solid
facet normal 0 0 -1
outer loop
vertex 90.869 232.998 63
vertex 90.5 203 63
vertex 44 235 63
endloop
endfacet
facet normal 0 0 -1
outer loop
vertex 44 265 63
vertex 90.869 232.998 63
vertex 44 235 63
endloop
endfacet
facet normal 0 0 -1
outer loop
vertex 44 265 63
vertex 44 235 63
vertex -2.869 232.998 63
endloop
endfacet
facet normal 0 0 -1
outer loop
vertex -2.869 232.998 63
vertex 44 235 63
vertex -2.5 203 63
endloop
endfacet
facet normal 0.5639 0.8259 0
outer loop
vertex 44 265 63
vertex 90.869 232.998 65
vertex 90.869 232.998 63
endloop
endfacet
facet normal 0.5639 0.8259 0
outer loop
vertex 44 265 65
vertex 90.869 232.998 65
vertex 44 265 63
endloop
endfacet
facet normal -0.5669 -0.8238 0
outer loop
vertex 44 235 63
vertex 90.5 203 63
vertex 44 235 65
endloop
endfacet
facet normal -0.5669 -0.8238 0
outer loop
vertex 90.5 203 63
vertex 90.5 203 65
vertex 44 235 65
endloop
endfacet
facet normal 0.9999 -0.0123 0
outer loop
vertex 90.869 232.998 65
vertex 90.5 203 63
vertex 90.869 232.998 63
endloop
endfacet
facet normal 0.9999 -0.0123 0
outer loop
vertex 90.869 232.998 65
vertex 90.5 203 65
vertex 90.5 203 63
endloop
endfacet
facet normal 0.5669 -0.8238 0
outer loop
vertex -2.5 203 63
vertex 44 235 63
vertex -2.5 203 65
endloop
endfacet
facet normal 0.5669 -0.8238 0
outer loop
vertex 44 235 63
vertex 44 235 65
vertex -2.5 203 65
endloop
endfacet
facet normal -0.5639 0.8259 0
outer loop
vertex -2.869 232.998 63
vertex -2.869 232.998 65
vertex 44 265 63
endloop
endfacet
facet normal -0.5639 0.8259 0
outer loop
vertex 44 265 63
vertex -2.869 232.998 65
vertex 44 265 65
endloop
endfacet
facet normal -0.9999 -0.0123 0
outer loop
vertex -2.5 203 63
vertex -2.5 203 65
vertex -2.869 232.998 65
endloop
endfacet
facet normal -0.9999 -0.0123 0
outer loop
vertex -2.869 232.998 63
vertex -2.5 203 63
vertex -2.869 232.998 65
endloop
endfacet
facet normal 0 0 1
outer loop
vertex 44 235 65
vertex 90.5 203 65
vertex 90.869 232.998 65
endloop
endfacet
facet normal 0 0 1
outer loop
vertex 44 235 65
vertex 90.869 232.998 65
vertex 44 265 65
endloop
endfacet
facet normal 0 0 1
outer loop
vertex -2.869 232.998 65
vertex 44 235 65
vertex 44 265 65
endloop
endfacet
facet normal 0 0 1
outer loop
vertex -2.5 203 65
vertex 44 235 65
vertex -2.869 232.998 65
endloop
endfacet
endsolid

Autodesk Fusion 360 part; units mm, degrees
sketch "Esboço1" plane through (0, 0, 0) normal (0, 0, 1) x (1, 0, 0)
  line L0 (0, 0) -> (88, 0)
  line L1 (-2.5, 203) -> (0, 0)
  line L2 (90.5, 203) -> (88, 0)
  line L3 (44, 235) -> (90.5, 203)
  line L4 (44, 235) -> (-2.5, 203)
  line L5 (88.487, 201.9575) -> (86.0245, 2)
  line L6 (1.9755, 2) -> (86.0245, 2)
  line L7 (-0.487, 201.9575) -> (1.9755, 2)
  line L8 (44, 232.5722) -> (-0.487, 201.9575)
  line L9 (44, 232.5722) -> (88.487, 201.9575)
  dimension "d1" = 88
  dimension "d7" = -2
sketch "Esboço2" plane through (0, 0, 5) normal (0, 0, 1) x (-1, 0, 0)
  line L0 (-1.9755, -2) -> (0.487, -201.9575)
  line L1 (0.487, -201.9575) -> (-44, -232.5722)
  line L2 (-44, -232.5722) -> (-88.487, -201.9575)
  line L3 (-88.487, -201.9575) -> (-86.0245, -2)
  line L4 (-86.0245, -2) -> (-1.9755, -2)
  line L5 (-90.5, -203) -> (-44, -235)
  line L6 (-44, -235) -> (2.5, -203)
  line L7 (2.5, -203) -> (0, 0)
  line L8 (0, 0) -> (-88, 0)
  line L9 (-88, 0) -> (-90.5, -203)
  line L10 (-44, -228.9304) -> (-85.4675, -200.3937)
  line L11 (-85.4675, -200.3937) -> (-83.0612, -5)
  line L12 (-83.0612, -5) -> (-4.9388, -5)
  line L13 (-4.9388, -5) -> (-2.5325, -200.3937)
  line L14 (-2.5325, -200.3937) -> (-44, -228.9304)
  dimension "d10" = 3
sketch "Esboço3" plane through (0, 0, 5) normal (0, 0, 1) x (-1, 0, 0)
  line L0 (-4.9388, -5) -> (-2.5325, -200.3937)
  line L1 (-2.5325, -200.3937) -> (-44, -228.9304)
  line L2 (-44, -228.9304) -> (-85.4675, -200.3937)
  line L3 (-85.4675, -200.3937) -> (-83.0612, -5)
  line L4 (-83.0612, -5) -> (-4.9388, -5)
  line L5 (-4.0422, -199.6117) -> (-44, -227.1096)
  line L6 (-44, -227.1096) -> (-83.9578, -199.6117)
  line L7 (-83.9578, -199.6117) -> (-81.5796, -6.5)
  line L8 (-81.5796, -6.5) -> (-6.4204, -6.5)
  line L9 (-6.4204, -6.5) -> (-4.0422, -199.6117)
  line L10 (-86.0245, -2) -> (-88.487, -201.9575)
  line L11 (-88.487, -201.9575) -> (-44, -232.5722)
  line L12 (-44, -232.5722) -> (0.487, -201.9575)
  line L13 (0.487, -201.9575) -> (-1.9755, -2)
  line L14 (-1.9755, -2) -> (-86.0245, -2)
  dimension "d13" = 1.5
sketch "Esboço4" plane through (0, 0, 5) normal (0, 0, 1) x (-1, 0, 0)
  line L0 (-81.5796, -6.5) -> (-6.4204, -6.5)
  line L1 (-6.4204, -6.5) -> (-4.0422, -199.6117)
  line L2 (-4.0422, -199.6117) -> (-44, -227.1096)
  line L3 (-44, -227.1096) -> (-83.9578, -199.6117)
  line L4 (-83.9578, -199.6117) -> (-81.5796, -6.5)
  line L5 (-44, -233.1791) -> (0.9903, -202.2181)
  line L6 (0.9903, -202.2181) -> (-1.4816, -1.5)
  line L7 (-1.4816, -1.5) -> (-86.5184, -1.5)
  line L8 (-86.5184, -1.5) -> (-88.9903, -202.2181)
  line L9 (-88.9903, -202.2181) -> (-44, -233.1791)
  line L10 (-83.0612, -5) -> (-85.4675, -200.3937)
  line L11 (-85.4675, -200.3937) -> (-44, -228.9304)
  line L12 (-44, -228.9304) -> (-2.5325, -200.3937)
  line L13 (-2.5325, -200.3937) -> (-4.9388, -5)
  line L14 (-4.9388, -5) -> (-83.0612, -5)
sketch "Esboço5" plane through (86.4868, -1.0651, 0) normal (-0.9999, 0.0123, 0) x (-0.0123, -0.9999, 0)
  line L0 (-2.5653, 5) -> (-2.5653, 65)
  line L1 (-2.5653, 65) -> (-203.2986, 65)
  line L2 (-203.2986, 65) -> (-203.2986, 5)
  line L3 (-2.5653, 65) -> (-2.5653, 63)
  line L4 (-2.5653, 63) -> (-10.5653, 63)
  line L5 (-10.5653, 63) -> (-10.5653, 60)
  line L6 (-10.5653, 60) -> (-2.5653, 60)
  line L7 (-203.2986, 5) -> (-2.5653, 5)
  dimension "d19" = 2
  dimension "d20" = 8
  dimension "d21" = 3
sketch "Esboço6" plane through (0, 0, 63) normal (0, 0, 1) x (-1, 0, 0)
  line L0 (-86.6169, -9.4994) -> (-78.6175, -9.5979)
  line L1 (-78.6175, -9.5979) -> (-78.519, -1.5985)
  line L2 (-78.519, -1.5985) -> (-86.5184, -1.5)
  line L3 (-78.519, -1.5985) -> (-86.6169, -9.4994)
  line L4 (-86.5184, -1.5) -> (-86.6169, -9.4994)
sketch "Esboço7" plane through (0, 0, 63) normal (0, 0, 1) x (-1, 0, 0)
  line L0 (-86.6169, -9.4994) -> (-78.519, -1.5985)
  line L1 (-78.519, -1.5985) -> (-86.5184, -1.5)
  circle A0 centre (-84.5431, -3.5245) radius 1
  line L2 (-86.5184, -1.5) -> (-86.6169, -9.4994)
  dimension "d26" = 2
sketch "Esboço8" plane through (1.4999, 0.0185, 0) normal (0.9999, 0.0123, 0) x (-0.0123, 0.9999, 0)
  line L0 (202.215, 5) -> (202.215, 65)
  line L1 (202.215, 65) -> (1.4816, 65)
  line L2 (1.4816, 65) -> (1.4816, 5)
  line L3 (1.4816, 65) -> (1.4816, 63)
  line L4 (1.4816, 63) -> (9.4816, 63)
  line L5 (9.4816, 63) -> (9.4816, 60)
  line L6 (9.4816, 60) -> (1.4816, 60)
  line L7 (1.4816, 5) -> (202.215, 5)
  dimension "d29" = 2
  dimension "d30" = 8
sketch "Esboço9" plane through (0, 0, 63) normal (0, 0, 1) x (-1, 0, 0)
  line L0 (-1.4816, -1.5) -> (-9.481, -1.5985)
  line L1 (-9.481, -1.5985) -> (-9.3825, -9.5979)
  line L2 (-9.3825, -9.5979) -> (-1.3831, -9.4994)
  line L3 (-9.481, -1.5985) -> (-1.3831, -9.4994)
  line L4 (-1.3831, -9.4994) -> (-1.4816, -1.5)
sketch "Esboço10" plane through (0, 0, 63) normal (0, 0, 1) x (-1, 0, 0)
  line L0 (-9.481, -1.5985) -> (-1.3831, -9.4994)
  line L1 (-1.4816, -1.5) -> (-9.481, -1.5985)
  circle A0 centre (-3.4569, -3.5245) radius 1
  line L2 (-1.3831, -9.4994) -> (-1.4816, -1.5)
  dimension "d35" = 2
sketch "Esboço11" plane through (-94.7554, 137.6915, 0) normal (0.5669, -0.8238, 0) x (0.8238, 0.5669, 0)
  line L0 (168.4368, 5) -> (168.4368, 65)
  line L1 (168.4368, 65) -> (113.8226, 65)
  line L2 (113.8226, 65) -> (113.8226, 5)
  line L3 (113.8226, 5) -> (168.4368, 5)
sketch "Esboço12" plane through (0, 0, 0) normal (0, 0, 1) x (1, 0, 0)
ref_plane "Plano de trabalho2" through (0, 0, 60) normal (0, 0, 1) x (1, 0, 0)
sketch "Esboço13" plane through (0, 0, 60) normal (0, 0, 1) x (1, 0, 0)
  line L0 (44, 229.2) -> (38, 229.2)
  line L1 (44, 229.2) -> (49.6973, 229.2)
  line L2 (38, 229.2) -> (44, 233.5)
  line L3 (44, 233.5) -> (49.6973, 229.2)
sketch "Esboço14" plane through (0, 0, 63) normal (0, 0, 1) x (-1, 0, 0)
  line L0 (-38, -229.2) -> (-49.6973, -229.2)
  line L1 (-49.6973, -229.2) -> (-44, -233.5)
  circle A0 centre (-43.9788, -231.1896) radius 1
  line L2 (-44, -233.5) -> (-38, -229.2)
  dimension "d48" = 2
sketch "Esboço15" plane through (0, 0, 65) normal (0, 0, 1) x (-1, 0, 0)
  line L0 (-44, -233.1791) -> (-88.9903, -202.2181)
  line L1 (-88.9903, -202.2181) -> (-86.5184, -1.5)
  line L2 (-86.5184, -1.5) -> (-1.4816, -1.5)
  line L3 (-1.4816, -1.5) -> (0.9903, -202.2181)
  line L4 (0.9903, -202.2181) -> (-44, -233.1791)
  line L5 (-88, 0) -> (-90.5, -203)
  line L6 (-90.5, -203) -> (-44, -235)
  line L7 (-44, -235) -> (2.5, -203)
  line L8 (2.5, -203) -> (0, 0)
  line L9 (0, 0) -> (-88, 0)
  line L10 (-196.5184, -1.5) -> (-111.4816, -1.5)
  line L11 (-198.9903, -202.2181) -> (-196.5184, -1.5)
  line L12 (-111.4816, -1.5) -> (-109.0097, -202.2181)
  line L13 (168.4368, 65) -> (113.8226, 65)
  line L14 (168.4368, 65) -> (113.8226, 65)
  line L15 (168.4368, 65) -> (113.8226, 65)
  line L16 (-154, -233.1791) -> (-198.9903, -202.2181)
  line L17 (-109.0097, -202.2181) -> (-154, -233.1791)
sketch "Esboço16" plane through (0, 0, 63) normal (0, 0, 1) x (-1, 0, 0)
  line L0 (-38, -229.2) -> (-49.6973, -229.2)
  line L1 (-49.6973, -229.2) -> (-44, -233.5)
  line L2 (-44, -233.5) -> (-38, -229.2)
sketch "Esboço17" plane through (0, 0, 67) normal (0, 0, 1) x (-1, 0, 0)
  line L0 (-109.0097, -202.2181) -> (-111.4816, -1.5)
  line L1 (-111.4816, -1.5) -> (-196.5184, -1.5)
  line L2 (-196.5184, -1.5) -> (-198.9903, -202.2181)
  line L3 (-198.9903, -202.2181) -> (-154, -233.1791)
  line L4 (-154, -233.1791) -> (-109.0097, -202.2181)
  circle A0 centre (-154, -231.1891) radius 1
  dimension "d55" = 1.99
  dimension "d56" = 2
sketch "Esboço18" plane through (0, 0, 63) normal (0, 0, 1) x (-1, 0, 0)
  circle A0 centre (-84.5431, -3.5245) radius 1
  line L0 (-86.6169, -9.4994) -> (-78.519, -1.5985)
  line L1 (-78.519, -1.5985) -> (-86.5184, -1.5)
  line L2 (-86.5184, -1.5) -> (-86.6169, -9.4994)
sketch "Esboço19" plane through (0, 0, 67) normal (0, 0, 1) x (-1, 0, 0)
  circle A0 centre (-154, -231.1891) radius 1
  line L0 (-109.0097, -202.2181) -> (-111.4816, -1.5)
  line L1 (-111.4816, -1.5) -> (-196.5184, -1.5)
  line L2 (-196.5184, -1.5) -> (-198.9903, -202.2181)
  line L3 (-198.9903, -202.2181) -> (-154, -233.1791)
  line L4 (-154, -233.1791) -> (-109.0097, -202.2181)
  circle A1 centre (-194.2131, -3.138) radius 1
  circle A2 centre (-113.2857, -2.8975) radius 1
  dimension "d59" = 2.828
  dimension "d60" = 2
  dimension "d61" = 2.282
  dimension "d62" = 2
sketch "Esboço20" plane through (0, 0, 65) normal (0, 0, 1) x (-1, 0, 0)
  line L0 (-44, -233.1791) -> (-88.9903, -202.2181)
  line L1 (-88.9903, -202.2181) -> (-86.5184, -1.5)
  line L2 (-86.5184, -1.5) -> (-1.4816, -1.5)
  line L3 (-1.4816, -1.5) -> (0.9903, -202.2181)
  line L4 (0.9903, -202.2181) -> (-44, -233.1791)
  line L5 (-88, 0) -> (-90.5, -203)
  line L6 (-90.5, -203) -> (-44, -235)
  line L7 (-44, -235) -> (2.5, -203)
  line L8 (2.5, -203) -> (0, 0)
  line L9 (0, 0) -> (-88, 0)
  line L10 (-44, -235) -> (2.5, -203)
  line L11 (-90.5, -203) -> (-90.8694, -232.9977)
  line L12 (-90.8694, -232.9977) -> (-44, -265)
  line L13 (2.5, -203) -> (2.8694, -232.9977)
  line L14 (2.8694, -232.9977) -> (-44, -265)
  line L15 (-90.5, -203) -> (-44, -235)
  dimension "d65" = 30
  dimension "d66" = 30
  dimension "d67" = 30
extrude "Extrusão17" add sketch "Esboço20" against normal blind 2 contours L6 L7 L10 L11 L12 L13 L14 L15
